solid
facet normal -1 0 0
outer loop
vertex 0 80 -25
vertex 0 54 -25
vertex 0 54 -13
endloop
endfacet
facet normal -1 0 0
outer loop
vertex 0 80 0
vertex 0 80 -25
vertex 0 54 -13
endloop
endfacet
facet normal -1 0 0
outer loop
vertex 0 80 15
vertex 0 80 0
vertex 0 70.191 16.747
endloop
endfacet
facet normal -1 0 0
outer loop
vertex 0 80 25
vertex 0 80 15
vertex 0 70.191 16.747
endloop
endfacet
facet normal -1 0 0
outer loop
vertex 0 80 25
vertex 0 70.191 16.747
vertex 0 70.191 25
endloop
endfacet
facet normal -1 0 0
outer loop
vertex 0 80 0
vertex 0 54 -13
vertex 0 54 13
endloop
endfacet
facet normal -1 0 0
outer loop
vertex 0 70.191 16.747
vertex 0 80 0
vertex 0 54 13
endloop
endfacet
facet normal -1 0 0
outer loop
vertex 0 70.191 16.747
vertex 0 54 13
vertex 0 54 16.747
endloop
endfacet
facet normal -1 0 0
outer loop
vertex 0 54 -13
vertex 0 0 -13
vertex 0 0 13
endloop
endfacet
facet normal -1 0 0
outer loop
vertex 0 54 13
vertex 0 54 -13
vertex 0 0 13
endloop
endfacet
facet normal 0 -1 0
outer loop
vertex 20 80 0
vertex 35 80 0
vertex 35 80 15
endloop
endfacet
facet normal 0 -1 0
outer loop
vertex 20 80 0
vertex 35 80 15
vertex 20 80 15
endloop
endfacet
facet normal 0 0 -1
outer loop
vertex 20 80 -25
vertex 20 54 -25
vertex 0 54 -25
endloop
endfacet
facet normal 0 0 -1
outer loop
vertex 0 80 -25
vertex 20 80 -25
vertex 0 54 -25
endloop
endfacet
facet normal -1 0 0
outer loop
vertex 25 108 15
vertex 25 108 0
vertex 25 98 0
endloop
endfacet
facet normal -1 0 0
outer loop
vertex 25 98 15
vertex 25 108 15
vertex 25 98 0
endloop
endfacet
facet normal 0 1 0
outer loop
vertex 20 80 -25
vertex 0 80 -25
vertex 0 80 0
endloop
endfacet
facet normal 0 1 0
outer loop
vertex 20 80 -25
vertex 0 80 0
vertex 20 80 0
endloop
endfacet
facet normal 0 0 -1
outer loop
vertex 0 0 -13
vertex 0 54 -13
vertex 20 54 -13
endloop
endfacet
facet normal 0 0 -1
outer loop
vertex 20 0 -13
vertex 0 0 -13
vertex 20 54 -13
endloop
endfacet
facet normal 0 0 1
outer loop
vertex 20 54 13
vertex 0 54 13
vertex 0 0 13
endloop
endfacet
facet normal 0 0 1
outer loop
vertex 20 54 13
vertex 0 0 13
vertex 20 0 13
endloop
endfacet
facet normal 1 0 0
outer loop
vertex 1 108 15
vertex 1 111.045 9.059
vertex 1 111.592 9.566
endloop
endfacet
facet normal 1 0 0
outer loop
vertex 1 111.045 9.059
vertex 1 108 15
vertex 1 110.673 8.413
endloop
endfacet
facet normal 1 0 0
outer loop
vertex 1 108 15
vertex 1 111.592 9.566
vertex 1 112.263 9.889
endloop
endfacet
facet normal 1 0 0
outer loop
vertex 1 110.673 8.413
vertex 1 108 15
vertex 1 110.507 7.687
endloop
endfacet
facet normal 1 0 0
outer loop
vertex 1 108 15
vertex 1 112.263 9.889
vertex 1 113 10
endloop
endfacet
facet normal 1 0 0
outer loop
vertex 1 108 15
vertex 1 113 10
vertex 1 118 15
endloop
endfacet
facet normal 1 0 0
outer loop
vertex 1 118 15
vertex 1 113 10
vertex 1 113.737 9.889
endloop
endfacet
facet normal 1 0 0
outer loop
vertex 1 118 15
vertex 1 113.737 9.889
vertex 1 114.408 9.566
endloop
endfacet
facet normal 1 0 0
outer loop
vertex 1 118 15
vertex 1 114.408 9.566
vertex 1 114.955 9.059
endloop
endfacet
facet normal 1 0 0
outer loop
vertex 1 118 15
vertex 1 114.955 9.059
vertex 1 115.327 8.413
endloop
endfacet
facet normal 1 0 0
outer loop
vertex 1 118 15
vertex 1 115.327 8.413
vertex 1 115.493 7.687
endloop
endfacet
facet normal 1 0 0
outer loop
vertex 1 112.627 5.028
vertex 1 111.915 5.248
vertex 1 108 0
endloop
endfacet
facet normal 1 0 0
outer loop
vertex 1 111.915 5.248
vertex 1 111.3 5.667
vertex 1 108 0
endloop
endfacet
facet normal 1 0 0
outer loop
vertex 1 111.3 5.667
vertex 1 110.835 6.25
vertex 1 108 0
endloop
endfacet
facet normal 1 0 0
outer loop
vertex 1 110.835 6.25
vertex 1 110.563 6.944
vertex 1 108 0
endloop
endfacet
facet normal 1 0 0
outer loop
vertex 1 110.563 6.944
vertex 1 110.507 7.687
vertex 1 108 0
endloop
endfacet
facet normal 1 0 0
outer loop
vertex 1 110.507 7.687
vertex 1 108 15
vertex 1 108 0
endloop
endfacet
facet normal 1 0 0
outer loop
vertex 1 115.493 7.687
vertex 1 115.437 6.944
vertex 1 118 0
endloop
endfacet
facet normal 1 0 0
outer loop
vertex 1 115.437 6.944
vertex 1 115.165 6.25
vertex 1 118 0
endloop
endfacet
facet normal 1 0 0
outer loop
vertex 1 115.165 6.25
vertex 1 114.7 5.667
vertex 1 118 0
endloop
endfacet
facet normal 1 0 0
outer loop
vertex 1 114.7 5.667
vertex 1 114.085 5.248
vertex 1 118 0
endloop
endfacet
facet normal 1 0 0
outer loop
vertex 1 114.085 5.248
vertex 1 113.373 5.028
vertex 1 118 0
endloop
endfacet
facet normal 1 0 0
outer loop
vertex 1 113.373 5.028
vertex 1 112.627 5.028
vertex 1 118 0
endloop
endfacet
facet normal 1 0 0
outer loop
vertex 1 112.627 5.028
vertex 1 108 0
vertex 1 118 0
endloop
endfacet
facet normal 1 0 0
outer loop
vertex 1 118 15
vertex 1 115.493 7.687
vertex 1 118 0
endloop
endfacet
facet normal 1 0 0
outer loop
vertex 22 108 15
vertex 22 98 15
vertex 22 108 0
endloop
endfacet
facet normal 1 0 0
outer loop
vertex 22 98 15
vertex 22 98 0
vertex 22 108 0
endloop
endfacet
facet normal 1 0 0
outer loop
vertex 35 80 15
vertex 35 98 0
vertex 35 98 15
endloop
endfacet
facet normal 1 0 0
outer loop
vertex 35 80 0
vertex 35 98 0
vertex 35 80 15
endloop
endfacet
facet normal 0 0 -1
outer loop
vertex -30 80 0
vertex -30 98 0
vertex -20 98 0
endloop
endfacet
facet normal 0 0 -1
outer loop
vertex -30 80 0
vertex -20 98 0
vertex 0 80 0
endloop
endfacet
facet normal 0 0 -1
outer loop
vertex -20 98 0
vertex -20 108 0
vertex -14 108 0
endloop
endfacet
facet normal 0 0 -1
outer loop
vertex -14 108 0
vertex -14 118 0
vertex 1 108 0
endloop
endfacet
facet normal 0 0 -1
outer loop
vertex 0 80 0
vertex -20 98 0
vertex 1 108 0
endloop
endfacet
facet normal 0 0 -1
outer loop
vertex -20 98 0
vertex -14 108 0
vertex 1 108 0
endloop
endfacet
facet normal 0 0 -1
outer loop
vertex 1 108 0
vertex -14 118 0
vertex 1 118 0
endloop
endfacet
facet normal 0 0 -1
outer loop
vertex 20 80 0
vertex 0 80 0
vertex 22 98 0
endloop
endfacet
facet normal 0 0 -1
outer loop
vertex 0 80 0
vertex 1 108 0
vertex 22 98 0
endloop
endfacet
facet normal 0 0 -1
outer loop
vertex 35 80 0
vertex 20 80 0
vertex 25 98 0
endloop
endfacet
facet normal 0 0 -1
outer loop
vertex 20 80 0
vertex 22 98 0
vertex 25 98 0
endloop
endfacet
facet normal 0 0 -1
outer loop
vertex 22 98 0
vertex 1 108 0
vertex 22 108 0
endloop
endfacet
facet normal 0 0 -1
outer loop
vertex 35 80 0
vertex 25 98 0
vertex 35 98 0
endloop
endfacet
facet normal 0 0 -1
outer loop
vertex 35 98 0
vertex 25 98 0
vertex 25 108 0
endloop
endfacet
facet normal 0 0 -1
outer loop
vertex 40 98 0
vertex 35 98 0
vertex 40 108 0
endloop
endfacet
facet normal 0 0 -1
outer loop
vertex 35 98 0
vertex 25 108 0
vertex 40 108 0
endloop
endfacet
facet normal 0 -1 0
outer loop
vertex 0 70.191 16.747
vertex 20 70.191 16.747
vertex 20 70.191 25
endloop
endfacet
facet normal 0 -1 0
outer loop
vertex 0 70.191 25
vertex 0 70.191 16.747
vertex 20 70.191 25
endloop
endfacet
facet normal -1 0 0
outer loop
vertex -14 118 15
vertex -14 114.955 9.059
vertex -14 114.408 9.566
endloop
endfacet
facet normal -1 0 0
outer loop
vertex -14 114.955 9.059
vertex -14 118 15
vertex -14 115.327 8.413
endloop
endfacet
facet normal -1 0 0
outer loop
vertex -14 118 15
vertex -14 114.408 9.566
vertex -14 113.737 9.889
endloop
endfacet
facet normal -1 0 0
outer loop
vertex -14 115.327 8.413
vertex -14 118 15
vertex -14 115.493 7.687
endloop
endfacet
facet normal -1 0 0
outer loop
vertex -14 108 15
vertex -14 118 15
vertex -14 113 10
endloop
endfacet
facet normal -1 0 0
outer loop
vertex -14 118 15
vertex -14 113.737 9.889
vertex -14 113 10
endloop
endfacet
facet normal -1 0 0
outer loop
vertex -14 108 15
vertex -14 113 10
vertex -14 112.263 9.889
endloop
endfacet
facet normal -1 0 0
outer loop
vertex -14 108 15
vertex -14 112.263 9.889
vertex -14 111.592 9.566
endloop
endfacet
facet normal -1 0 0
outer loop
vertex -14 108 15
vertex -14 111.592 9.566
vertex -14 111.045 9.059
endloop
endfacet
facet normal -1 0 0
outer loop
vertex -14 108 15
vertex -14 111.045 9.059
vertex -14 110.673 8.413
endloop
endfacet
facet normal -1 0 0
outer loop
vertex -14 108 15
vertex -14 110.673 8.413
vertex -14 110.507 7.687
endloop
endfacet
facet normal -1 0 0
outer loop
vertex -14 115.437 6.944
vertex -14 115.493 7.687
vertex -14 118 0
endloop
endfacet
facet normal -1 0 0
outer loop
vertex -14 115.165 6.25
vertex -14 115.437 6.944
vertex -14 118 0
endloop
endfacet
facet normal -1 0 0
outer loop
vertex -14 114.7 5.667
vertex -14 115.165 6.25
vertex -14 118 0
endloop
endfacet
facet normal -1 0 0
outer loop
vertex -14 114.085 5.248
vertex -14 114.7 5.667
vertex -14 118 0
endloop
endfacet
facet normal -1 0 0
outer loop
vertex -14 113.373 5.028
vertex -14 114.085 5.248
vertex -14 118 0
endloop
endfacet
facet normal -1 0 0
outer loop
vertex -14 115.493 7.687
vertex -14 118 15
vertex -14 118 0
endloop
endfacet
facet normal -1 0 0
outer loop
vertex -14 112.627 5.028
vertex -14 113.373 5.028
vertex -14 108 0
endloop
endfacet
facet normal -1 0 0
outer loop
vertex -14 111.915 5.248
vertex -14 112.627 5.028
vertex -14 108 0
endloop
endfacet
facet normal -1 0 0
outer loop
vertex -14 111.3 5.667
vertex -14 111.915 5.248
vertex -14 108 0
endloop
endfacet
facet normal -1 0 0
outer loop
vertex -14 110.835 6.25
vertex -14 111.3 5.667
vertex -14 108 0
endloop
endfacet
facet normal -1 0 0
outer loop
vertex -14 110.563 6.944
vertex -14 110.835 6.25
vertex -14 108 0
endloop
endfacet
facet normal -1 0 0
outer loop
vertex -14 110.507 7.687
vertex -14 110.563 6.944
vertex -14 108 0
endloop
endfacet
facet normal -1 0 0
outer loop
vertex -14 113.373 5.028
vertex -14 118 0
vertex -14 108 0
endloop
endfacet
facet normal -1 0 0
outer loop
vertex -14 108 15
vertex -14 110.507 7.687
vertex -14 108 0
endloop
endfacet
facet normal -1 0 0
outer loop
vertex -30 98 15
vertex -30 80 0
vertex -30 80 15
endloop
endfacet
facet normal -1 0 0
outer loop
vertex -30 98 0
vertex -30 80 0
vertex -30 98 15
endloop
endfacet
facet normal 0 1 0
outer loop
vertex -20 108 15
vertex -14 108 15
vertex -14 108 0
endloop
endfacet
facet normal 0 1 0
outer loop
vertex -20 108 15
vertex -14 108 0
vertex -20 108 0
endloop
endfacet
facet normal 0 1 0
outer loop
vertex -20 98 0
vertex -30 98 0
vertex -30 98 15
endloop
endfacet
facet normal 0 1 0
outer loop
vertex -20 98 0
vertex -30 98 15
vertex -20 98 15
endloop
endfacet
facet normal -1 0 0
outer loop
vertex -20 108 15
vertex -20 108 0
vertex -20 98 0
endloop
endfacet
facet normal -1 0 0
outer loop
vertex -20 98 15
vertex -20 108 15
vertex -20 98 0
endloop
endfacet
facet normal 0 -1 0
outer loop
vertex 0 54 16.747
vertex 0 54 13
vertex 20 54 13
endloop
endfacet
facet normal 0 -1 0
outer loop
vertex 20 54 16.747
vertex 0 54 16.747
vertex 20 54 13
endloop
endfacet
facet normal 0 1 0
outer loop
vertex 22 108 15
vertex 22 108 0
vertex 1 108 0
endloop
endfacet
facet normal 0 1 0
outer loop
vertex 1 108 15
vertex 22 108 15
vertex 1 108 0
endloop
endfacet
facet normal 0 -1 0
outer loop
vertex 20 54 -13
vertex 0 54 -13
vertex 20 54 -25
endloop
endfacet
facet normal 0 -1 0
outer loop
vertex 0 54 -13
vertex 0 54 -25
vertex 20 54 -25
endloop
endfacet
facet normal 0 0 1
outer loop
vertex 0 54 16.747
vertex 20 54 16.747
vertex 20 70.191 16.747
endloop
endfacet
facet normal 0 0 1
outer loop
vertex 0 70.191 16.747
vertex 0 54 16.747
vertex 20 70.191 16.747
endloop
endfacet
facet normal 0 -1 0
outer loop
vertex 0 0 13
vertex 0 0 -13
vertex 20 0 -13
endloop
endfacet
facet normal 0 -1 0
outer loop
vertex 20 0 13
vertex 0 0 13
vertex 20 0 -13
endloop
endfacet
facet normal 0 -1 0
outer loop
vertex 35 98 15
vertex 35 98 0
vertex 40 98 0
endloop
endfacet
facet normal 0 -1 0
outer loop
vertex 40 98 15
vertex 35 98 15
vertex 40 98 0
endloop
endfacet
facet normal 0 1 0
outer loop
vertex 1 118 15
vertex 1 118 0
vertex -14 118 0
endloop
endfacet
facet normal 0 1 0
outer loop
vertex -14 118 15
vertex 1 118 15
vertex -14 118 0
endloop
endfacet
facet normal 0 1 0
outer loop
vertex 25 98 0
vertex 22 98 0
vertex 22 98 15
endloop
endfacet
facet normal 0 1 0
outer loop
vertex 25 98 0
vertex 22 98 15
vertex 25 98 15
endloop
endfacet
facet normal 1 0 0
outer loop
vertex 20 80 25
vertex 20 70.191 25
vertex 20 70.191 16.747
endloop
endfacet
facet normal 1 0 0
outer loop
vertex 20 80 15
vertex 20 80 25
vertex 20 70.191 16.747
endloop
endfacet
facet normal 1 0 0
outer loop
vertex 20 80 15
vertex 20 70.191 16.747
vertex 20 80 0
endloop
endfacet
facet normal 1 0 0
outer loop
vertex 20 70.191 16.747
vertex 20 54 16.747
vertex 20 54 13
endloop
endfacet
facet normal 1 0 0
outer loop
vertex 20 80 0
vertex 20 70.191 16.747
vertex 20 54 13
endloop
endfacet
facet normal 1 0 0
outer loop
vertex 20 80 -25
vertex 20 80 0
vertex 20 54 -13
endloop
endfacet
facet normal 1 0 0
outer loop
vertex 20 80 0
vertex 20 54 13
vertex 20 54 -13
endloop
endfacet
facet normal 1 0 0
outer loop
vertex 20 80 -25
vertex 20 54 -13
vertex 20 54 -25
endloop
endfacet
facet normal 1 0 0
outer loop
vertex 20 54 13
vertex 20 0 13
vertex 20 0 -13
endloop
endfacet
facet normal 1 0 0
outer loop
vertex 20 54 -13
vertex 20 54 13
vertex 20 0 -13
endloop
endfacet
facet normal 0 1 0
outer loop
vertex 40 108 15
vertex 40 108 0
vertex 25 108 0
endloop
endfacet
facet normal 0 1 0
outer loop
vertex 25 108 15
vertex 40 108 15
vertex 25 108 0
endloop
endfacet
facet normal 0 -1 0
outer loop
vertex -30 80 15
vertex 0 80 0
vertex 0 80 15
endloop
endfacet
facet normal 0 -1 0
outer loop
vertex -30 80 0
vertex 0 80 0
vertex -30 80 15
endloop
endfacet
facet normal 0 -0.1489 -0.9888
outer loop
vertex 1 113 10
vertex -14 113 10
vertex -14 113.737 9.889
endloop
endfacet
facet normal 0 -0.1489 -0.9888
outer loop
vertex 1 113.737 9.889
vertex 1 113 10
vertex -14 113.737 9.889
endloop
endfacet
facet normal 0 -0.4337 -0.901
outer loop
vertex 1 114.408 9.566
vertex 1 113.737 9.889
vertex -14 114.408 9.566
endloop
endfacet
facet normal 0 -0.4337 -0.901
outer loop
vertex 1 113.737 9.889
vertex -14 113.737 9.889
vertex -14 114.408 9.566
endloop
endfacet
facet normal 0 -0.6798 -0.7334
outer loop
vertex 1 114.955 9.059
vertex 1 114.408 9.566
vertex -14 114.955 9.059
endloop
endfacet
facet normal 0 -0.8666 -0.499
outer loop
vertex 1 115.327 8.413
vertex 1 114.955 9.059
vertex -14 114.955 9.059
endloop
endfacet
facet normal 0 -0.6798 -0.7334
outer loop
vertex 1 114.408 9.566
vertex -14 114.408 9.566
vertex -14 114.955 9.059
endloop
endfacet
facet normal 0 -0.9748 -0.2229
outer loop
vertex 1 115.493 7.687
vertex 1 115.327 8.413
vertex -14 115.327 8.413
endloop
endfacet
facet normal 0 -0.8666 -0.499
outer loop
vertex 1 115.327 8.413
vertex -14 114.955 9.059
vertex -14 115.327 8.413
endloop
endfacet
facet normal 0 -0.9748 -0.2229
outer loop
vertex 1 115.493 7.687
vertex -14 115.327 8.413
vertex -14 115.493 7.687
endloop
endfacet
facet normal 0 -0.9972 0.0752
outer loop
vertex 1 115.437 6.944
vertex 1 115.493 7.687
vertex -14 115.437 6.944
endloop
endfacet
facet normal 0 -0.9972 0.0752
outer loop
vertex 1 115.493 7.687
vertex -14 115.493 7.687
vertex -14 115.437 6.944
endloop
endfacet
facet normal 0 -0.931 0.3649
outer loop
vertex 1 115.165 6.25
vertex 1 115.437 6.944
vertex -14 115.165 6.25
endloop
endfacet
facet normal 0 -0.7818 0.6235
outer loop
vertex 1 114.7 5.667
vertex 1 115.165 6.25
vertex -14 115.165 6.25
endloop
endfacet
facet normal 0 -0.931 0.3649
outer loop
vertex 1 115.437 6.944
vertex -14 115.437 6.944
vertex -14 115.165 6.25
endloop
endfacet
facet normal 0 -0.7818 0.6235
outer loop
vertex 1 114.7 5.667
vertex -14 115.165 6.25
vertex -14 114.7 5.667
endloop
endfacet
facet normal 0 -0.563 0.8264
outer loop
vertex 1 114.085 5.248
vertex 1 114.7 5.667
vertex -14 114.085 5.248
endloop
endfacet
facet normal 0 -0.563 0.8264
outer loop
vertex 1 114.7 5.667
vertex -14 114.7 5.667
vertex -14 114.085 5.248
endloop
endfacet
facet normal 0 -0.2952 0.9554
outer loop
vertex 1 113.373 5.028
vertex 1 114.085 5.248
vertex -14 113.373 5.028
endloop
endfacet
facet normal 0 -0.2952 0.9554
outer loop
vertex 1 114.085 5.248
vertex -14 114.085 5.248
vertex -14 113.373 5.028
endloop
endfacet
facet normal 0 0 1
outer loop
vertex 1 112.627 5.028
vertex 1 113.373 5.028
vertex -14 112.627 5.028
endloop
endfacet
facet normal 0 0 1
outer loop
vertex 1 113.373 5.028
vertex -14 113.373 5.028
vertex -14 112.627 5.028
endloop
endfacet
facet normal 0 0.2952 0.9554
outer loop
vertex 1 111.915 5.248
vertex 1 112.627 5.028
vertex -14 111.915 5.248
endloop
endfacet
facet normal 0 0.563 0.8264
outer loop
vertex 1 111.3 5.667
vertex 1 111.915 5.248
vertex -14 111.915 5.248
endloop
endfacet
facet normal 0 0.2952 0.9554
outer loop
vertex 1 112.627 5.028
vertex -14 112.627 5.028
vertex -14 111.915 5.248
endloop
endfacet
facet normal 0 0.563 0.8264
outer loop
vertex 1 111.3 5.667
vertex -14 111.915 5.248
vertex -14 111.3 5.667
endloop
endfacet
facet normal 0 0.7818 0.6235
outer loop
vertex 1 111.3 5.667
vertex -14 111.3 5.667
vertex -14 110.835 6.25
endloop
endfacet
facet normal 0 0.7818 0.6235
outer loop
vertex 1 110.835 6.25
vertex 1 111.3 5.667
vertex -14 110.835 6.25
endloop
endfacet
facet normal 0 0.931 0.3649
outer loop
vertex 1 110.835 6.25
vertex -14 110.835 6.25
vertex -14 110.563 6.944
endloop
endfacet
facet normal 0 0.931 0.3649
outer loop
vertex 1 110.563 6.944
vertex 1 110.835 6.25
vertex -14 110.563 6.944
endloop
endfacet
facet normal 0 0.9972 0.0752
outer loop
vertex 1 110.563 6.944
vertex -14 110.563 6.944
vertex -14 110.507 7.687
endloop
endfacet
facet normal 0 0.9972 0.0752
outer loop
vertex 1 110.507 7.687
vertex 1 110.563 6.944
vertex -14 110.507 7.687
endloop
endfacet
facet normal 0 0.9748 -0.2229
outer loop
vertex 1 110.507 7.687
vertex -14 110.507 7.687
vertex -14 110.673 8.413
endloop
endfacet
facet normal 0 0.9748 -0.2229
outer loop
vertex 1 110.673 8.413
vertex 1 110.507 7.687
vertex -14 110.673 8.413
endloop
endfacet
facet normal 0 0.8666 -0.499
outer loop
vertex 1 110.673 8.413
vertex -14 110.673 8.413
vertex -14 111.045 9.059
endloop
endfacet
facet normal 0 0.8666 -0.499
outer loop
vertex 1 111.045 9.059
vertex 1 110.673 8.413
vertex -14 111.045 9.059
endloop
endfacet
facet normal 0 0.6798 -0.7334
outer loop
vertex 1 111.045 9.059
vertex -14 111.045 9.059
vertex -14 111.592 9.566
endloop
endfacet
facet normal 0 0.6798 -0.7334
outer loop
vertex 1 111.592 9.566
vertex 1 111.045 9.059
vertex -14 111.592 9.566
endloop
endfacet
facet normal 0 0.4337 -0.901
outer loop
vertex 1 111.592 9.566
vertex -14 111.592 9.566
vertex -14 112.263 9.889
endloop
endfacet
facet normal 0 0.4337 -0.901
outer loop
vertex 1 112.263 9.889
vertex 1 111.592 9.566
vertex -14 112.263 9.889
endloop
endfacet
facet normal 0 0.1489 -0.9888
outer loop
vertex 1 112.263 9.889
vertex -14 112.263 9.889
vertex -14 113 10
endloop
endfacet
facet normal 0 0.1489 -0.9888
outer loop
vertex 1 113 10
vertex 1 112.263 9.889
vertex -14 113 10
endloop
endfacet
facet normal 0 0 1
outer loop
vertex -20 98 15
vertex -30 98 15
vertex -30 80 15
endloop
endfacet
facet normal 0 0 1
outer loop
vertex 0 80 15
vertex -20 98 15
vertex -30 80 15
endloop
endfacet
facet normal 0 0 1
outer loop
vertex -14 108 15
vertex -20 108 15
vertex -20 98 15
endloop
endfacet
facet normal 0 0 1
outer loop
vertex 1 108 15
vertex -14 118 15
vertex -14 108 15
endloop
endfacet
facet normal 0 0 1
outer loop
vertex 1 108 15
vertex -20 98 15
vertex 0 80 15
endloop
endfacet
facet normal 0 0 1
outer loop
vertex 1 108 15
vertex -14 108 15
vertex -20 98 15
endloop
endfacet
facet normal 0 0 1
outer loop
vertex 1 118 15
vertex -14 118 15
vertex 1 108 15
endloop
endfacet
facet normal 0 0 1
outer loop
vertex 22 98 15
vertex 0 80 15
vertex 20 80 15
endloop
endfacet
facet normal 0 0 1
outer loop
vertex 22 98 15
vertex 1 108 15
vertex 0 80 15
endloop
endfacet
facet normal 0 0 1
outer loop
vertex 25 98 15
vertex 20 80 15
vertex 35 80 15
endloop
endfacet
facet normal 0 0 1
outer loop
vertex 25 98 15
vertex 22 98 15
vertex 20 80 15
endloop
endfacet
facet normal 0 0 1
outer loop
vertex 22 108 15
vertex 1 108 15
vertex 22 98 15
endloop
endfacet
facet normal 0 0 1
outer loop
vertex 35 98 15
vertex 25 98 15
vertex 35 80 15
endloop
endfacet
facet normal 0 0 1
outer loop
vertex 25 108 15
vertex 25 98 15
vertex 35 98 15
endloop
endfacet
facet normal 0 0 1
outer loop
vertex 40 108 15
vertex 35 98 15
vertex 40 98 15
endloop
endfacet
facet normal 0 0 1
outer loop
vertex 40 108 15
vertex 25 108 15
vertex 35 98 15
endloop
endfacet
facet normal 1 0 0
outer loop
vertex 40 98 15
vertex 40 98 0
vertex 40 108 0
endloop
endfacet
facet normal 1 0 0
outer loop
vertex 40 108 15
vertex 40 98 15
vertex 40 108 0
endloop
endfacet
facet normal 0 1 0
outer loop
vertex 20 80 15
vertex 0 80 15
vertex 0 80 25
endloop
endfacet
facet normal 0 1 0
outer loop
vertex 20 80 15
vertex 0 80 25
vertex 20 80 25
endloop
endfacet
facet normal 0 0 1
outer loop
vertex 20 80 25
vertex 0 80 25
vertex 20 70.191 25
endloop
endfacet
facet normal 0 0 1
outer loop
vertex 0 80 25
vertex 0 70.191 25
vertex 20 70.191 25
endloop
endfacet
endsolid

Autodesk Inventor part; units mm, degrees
ref_plane "YZ Plane" through (0, 0, 0) normal (1, 0, 0) x (0, 1, 0)
ref_plane "XZ Plane" through (0, 0, 0) normal (0, 1, 0) x (-1, 0, 0)
ref_plane "XY Plane" through (0, 0, 0) normal (0, 0, 1) x (1, 0, 0)
sketch "Sketch4" plane through (0, 0, 0) normal (0, 0, 1) x (1, 0, 0)
  line L0 (0, 0) -> (20, 0)
  line L1 (20, 0) -> (20, 54)
  line L2 (20, 54) -> (0, 54)
  line L3 (0, 54) -> (0, 0)
  dimension "d18" = 20
  dimension "d19" = 54
extrude "Extrusion4" add sketch "Sketch4" along normal mid plane 26
sketch "Sketch5" plane through (0, 54, 13) normal (0, 1, 0) x (1, 0, 0)
  line L0 (0, -12) -> (20, -12)
  line L1 (20, -12) -> (20, 38)
  line L2 (20, 38) -> (0, 38)
  line L3 (0, 38) -> (0, -12)
  line L4 (20, 26) -> (20, 0) projected
  line L5 (0, 26) -> (0, 0) projected
  point P0 (0, 13)
  point P1 (10, 38)
  point P2 (0, 13)
  dimension "d22" = 20
  dimension "d23" = 50
  dimension "d24" = 25
extrude "Extrusion5" add sketch "Sketch5" along normal blind 26
sketch "Sketch6" plane through (0, 0, 0) normal (0, 0, 1) x (1, 0, 0)
  line L0 (35, 80) -> (-30, 80)
  line L1 (-30, 80) -> (-30, 98)
  line L2 (-30, 98) -> (35, 98)
  line L3 (35, 98) -> (35, 80)
  line L4 (0, 80) -> (20, 80) projected
  line L5 (20, 54) -> (20, 80) projected
  line L6 (0, 54) -> (0, 80) projected
  line L7 (-20, 98) -> (22, 98)
  line L8 (22, 98) -> (22, 108)
  line L9 (22, 108) -> (-20, 108)
  line L10 (-20, 108) -> (-20, 98)
  line L11 (25, 98) -> (40, 98)
  line L12 (40, 98) -> (40, 108)
  line L13 (40, 108) -> (25, 108)
  line L14 (25, 108) -> (25, 98)
  line L15 (-14, 108) -> (1, 108)
  line L16 (1, 108) -> (1, 118)
  line L17 (1, 118) -> (-14, 118)
  line L18 (-14, 118) -> (-14, 108)
  point P0 (0, 0)
  point P1 (35, 98)
  point P2 (22, 98)
  point P3 (-20, 103)
  point P4 (-14, 113)
  dimension "d27" = 18
  dimension "d28" = 15
  dimension "d29" = 30
  dimension "d32" = 10
  dimension "d33" = 10
  dimension "d34" = 15
  dimension "d38" = 3
  dimension "d39" = 15
  dimension "d40" = 5
  dimension "d41" = 10
  dimension "d42" = 6
extrude "Extrusion6" add sketch "Sketch6" along normal blind 15
sketch "Sketch9" plane through (0, 0, 13) normal (0, 0, 1) x (1, 0, 0)
  point P0 (0, 0)
  point P1 (10, 29.6336)
sketch "Sketch10" plane through (0, 0, 15) normal (0, 0, 1) x (1, 0, 0)
  point P0 (0, 0)
  point P1 (-8.9634, 87.1554)
sketch "Sketch11" plane through (40, 98, 15) normal (1, 0, 0) x (0, 0, -1)
  point P0 (15, -98)
  point P1 (7.5, 5)
sketch "Sketch12" plane through (20, 0, 13) normal (1, 0, 0) x (0, 0, -1)
  point P0 (13, 0)
  point P1 (13, 63.2643)
sketch "Sketch13" plane through (-14, 108, 15) normal (-1, 0, 0) x (0, 0, 1)
  circle A0 centre (-7.5, 5) radius 2.5
  line L0 (-15, 10) -> (0, 10) projected
  line L1 (0, -10) -> (0, 0) projected
  line L2 (-15, 10) -> (0, 0) construction
  point P0 (-15, -108)
  dimension "d35" = 5
extrude "Extrusion7" cut sketch "Sketch13" against normal through all
sketch "Sketch14" plane through (20, 0, 13) normal (1, 0, 0) x (0, 0, -1)
  line L0 (-31.824, 26.3525) -> (-3.7474, 26.3525)
  line L1 (-3.7474, 26.3525) -> (-3.7474, 70.1914)
  line L2 (-3.7474, 70.1914) -> (-31.824, 70.1914)
  line L3 (-31.824, 70.1914) -> (-31.824, 26.3525)
  line L4 (-31.824, 26.3525) -> (-3.7474, 70.1914) construction
  line L5 (-3.7474, 26.3525) -> (-31.824, 70.1914) construction
  point P0 (13, 0)
  point P1 (-17.7857, 48.272)
extrude "Extrusion8" cut sketch "Sketch14" against normal through all
equation "\"d24\" = 0.5 * d23"
properties part number "micromanipulator"
